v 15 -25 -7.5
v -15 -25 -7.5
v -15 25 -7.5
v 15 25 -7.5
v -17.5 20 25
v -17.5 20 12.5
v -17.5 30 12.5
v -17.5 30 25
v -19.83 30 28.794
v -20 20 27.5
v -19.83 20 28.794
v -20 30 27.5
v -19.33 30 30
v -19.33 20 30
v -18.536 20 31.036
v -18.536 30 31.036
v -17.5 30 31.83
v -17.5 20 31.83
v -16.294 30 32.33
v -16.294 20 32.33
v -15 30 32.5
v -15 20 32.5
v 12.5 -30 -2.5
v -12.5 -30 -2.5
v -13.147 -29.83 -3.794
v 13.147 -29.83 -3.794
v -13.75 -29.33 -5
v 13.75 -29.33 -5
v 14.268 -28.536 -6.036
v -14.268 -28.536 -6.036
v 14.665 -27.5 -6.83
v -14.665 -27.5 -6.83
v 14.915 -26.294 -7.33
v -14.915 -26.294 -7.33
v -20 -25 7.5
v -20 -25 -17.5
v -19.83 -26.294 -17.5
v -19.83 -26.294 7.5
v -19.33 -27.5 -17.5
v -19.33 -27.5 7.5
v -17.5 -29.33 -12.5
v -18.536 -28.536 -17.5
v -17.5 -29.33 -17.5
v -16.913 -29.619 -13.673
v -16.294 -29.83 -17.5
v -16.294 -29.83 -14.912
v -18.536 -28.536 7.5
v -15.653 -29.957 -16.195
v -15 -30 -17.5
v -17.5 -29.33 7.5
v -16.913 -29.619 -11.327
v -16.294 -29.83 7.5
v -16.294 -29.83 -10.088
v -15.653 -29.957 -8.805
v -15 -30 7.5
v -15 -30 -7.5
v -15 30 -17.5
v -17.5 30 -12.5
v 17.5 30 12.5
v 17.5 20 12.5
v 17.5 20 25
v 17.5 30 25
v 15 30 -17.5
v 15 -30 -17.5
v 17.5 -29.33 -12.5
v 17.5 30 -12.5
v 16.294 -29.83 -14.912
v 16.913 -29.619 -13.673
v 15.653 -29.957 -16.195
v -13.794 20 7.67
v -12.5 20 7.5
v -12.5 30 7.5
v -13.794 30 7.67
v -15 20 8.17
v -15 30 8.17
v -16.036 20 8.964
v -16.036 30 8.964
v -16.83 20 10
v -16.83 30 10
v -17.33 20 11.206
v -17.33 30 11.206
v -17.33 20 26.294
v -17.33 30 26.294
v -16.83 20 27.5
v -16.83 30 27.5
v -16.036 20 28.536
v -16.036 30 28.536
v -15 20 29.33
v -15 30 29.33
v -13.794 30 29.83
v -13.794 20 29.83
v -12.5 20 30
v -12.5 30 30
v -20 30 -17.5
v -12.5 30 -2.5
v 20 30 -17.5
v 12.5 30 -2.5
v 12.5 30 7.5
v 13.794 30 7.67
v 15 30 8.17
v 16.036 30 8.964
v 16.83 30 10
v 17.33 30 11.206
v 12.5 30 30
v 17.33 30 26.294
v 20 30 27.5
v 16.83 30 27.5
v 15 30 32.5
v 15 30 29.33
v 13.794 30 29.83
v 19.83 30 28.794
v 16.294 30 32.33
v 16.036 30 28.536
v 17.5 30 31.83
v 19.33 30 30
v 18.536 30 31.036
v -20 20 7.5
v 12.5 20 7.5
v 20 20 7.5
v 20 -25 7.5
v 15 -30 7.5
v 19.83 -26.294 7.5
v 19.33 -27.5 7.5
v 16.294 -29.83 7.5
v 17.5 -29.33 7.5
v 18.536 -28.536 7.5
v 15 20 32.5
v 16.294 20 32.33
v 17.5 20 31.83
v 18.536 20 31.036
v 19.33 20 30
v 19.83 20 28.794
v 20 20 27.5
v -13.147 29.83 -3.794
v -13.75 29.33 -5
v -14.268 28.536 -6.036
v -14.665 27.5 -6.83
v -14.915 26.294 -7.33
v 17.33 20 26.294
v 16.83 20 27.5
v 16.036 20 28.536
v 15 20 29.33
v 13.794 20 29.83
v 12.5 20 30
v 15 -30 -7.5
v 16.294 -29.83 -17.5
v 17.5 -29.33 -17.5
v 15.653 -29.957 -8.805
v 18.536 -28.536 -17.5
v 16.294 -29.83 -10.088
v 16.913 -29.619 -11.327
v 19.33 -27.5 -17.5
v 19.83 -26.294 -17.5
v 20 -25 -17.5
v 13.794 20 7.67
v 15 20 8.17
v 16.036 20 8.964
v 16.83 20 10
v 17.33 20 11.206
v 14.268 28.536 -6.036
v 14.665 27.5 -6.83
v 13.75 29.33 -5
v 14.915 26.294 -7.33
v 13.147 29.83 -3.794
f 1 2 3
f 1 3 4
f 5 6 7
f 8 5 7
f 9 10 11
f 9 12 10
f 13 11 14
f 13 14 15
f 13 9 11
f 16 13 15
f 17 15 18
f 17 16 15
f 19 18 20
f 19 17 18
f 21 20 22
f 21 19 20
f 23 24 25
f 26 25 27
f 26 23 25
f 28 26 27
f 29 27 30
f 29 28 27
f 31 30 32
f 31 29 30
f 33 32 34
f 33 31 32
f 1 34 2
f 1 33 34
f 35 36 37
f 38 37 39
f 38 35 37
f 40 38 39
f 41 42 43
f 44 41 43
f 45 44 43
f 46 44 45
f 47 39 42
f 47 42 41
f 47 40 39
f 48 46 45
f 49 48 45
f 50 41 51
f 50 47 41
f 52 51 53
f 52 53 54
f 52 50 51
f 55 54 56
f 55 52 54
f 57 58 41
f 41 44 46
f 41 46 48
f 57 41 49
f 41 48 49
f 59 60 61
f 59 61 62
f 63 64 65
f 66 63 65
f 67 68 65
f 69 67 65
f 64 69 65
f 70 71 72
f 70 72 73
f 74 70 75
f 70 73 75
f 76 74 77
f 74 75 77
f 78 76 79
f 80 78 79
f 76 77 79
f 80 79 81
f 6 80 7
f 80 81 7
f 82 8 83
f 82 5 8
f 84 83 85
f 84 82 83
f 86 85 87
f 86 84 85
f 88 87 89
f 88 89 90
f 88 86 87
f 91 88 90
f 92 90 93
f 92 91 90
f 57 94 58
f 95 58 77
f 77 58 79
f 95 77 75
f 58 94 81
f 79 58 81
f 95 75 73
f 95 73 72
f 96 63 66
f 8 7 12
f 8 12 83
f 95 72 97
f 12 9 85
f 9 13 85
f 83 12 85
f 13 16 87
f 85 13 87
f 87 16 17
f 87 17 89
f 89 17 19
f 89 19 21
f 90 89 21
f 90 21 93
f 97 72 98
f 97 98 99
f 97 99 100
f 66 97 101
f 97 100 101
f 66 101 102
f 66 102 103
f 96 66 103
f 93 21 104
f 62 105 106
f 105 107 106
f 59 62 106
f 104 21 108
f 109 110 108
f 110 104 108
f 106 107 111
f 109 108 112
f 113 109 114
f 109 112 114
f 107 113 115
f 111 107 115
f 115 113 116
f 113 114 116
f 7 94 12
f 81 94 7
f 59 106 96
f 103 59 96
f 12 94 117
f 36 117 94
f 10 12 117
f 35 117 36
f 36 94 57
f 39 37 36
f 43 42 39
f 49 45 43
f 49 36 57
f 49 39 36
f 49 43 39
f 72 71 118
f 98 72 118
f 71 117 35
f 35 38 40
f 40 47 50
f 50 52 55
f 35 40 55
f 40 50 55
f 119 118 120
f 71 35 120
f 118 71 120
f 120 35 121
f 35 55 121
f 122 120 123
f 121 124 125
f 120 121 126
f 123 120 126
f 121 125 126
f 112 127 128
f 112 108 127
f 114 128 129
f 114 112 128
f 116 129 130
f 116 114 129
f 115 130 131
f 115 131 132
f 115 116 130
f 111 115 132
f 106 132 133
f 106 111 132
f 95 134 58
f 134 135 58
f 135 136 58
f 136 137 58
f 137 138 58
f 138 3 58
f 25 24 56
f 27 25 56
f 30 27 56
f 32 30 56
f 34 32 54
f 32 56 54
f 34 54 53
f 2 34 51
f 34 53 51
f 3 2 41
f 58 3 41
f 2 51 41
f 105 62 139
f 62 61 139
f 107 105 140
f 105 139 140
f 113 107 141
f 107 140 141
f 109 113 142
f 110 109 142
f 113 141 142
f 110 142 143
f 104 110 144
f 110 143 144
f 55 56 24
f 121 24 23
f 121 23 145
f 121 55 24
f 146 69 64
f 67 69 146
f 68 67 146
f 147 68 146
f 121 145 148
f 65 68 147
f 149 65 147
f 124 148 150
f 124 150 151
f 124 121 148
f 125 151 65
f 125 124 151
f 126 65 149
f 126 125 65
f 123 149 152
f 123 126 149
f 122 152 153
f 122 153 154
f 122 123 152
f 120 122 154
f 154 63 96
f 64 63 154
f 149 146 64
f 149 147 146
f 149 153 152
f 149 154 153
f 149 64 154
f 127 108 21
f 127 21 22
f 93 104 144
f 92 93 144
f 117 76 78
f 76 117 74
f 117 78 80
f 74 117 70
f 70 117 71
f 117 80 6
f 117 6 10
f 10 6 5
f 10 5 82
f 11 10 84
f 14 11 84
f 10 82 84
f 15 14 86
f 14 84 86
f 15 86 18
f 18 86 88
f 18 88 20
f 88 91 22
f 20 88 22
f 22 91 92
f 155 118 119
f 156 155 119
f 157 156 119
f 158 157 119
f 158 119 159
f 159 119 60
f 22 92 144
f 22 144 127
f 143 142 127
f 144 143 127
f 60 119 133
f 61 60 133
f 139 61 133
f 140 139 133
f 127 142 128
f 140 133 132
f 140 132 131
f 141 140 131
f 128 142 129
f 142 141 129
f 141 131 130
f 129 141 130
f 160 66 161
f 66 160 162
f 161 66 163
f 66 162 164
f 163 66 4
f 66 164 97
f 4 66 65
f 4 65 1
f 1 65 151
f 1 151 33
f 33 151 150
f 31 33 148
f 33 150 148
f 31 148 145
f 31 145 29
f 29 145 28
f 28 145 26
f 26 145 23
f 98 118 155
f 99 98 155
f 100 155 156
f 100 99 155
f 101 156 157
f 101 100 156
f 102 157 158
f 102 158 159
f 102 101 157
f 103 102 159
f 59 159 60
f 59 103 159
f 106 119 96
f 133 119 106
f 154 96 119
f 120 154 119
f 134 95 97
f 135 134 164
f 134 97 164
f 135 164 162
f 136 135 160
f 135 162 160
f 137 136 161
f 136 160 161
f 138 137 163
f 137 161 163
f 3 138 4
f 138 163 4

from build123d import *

# Parameters (mm, degrees)
F0_W     = 40
F0_H     = 15
F1_DEPTH = 30
F2_W     = 2.5
F2_H     = 10
F3_DEPTH = 25
F4_W     = 10
F4_H     = 2.5
F5_DEPTH = 35
F6_W     = 5
F6_H     = 60
F7_DEPTH = 10
F9_DEPTH = 60.001
F10_R    = 5


with BuildPart() as f1:
    # F0 (on Front) → F1 (new body, symmetric)
    with BuildSketch(Plane.XZ):
        Rectangle(F0_W, F0_H)
    extrude(amount=F1_DEPTH, both=True)

    # F2 (on face) → F3 (join)
    with BuildSketch(Plane.XY.offset(7.5)):
        with Locations((-18.75, 25)):
            Rectangle(F2_W, F2_H)
        with Locations((18.75, 25)):
            Rectangle(F2_W, F2_H)
    extrude(amount=F3_DEPTH)

    # F4 (on face) → F5 (join, through all)
    with BuildSketch(Plane(origin=(17.5, 0, 0), x_dir=(0, -1, 0), z_dir=(-1, 0, 0))):
        with Locations((-25, 31.25)):
            Rectangle(F4_W, F4_H)
    extrude(amount=F5_DEPTH)

    # F6 (on face) → F7 (join)
    with BuildSketch(Plane(origin=(0, 0, -7.5), x_dir=(1, 0, 0), z_dir=(0, 0, -1))):
        with Locations((-17.5, 0)):
            Rectangle(F6_W, F6_H)
        with Locations((17.5, 0)):
            Rectangle(F6_W, F6_H)
    extrude(amount=F7_DEPTH)

    # F8 (on face) → F9 (cut, through all)
    with BuildSketch(Plane.XZ.offset(30)):
        Polygon((-15, -7.5), (-17.5, -12.5), (-15, -17.5), align=None)
        Polygon((17.5, -12.5), (15, -7.5), (15, -17.5), align=None)
    extrude(amount=-F9_DEPTH, mode=Mode.SUBTRACT)

    # F10
    f10_edges = [f1.edges().sort_by_distance(p)[0] for p in [
        (20, 25, 32.5),
        (-20, 25, 32.5),
        (-17.5, 25, 30),
        (17.5, 25, 30),
        (17.5, 25, 7.5),
        (-17.5, 25, 7.5),
        (20, -30, -5),
        (-20, -30, -5),
        (0, -30, -7.5),
        (0, 30, -7.5),
    ]]
    fillet(f10_edges, radius=F10_R)


solid = f1.part
